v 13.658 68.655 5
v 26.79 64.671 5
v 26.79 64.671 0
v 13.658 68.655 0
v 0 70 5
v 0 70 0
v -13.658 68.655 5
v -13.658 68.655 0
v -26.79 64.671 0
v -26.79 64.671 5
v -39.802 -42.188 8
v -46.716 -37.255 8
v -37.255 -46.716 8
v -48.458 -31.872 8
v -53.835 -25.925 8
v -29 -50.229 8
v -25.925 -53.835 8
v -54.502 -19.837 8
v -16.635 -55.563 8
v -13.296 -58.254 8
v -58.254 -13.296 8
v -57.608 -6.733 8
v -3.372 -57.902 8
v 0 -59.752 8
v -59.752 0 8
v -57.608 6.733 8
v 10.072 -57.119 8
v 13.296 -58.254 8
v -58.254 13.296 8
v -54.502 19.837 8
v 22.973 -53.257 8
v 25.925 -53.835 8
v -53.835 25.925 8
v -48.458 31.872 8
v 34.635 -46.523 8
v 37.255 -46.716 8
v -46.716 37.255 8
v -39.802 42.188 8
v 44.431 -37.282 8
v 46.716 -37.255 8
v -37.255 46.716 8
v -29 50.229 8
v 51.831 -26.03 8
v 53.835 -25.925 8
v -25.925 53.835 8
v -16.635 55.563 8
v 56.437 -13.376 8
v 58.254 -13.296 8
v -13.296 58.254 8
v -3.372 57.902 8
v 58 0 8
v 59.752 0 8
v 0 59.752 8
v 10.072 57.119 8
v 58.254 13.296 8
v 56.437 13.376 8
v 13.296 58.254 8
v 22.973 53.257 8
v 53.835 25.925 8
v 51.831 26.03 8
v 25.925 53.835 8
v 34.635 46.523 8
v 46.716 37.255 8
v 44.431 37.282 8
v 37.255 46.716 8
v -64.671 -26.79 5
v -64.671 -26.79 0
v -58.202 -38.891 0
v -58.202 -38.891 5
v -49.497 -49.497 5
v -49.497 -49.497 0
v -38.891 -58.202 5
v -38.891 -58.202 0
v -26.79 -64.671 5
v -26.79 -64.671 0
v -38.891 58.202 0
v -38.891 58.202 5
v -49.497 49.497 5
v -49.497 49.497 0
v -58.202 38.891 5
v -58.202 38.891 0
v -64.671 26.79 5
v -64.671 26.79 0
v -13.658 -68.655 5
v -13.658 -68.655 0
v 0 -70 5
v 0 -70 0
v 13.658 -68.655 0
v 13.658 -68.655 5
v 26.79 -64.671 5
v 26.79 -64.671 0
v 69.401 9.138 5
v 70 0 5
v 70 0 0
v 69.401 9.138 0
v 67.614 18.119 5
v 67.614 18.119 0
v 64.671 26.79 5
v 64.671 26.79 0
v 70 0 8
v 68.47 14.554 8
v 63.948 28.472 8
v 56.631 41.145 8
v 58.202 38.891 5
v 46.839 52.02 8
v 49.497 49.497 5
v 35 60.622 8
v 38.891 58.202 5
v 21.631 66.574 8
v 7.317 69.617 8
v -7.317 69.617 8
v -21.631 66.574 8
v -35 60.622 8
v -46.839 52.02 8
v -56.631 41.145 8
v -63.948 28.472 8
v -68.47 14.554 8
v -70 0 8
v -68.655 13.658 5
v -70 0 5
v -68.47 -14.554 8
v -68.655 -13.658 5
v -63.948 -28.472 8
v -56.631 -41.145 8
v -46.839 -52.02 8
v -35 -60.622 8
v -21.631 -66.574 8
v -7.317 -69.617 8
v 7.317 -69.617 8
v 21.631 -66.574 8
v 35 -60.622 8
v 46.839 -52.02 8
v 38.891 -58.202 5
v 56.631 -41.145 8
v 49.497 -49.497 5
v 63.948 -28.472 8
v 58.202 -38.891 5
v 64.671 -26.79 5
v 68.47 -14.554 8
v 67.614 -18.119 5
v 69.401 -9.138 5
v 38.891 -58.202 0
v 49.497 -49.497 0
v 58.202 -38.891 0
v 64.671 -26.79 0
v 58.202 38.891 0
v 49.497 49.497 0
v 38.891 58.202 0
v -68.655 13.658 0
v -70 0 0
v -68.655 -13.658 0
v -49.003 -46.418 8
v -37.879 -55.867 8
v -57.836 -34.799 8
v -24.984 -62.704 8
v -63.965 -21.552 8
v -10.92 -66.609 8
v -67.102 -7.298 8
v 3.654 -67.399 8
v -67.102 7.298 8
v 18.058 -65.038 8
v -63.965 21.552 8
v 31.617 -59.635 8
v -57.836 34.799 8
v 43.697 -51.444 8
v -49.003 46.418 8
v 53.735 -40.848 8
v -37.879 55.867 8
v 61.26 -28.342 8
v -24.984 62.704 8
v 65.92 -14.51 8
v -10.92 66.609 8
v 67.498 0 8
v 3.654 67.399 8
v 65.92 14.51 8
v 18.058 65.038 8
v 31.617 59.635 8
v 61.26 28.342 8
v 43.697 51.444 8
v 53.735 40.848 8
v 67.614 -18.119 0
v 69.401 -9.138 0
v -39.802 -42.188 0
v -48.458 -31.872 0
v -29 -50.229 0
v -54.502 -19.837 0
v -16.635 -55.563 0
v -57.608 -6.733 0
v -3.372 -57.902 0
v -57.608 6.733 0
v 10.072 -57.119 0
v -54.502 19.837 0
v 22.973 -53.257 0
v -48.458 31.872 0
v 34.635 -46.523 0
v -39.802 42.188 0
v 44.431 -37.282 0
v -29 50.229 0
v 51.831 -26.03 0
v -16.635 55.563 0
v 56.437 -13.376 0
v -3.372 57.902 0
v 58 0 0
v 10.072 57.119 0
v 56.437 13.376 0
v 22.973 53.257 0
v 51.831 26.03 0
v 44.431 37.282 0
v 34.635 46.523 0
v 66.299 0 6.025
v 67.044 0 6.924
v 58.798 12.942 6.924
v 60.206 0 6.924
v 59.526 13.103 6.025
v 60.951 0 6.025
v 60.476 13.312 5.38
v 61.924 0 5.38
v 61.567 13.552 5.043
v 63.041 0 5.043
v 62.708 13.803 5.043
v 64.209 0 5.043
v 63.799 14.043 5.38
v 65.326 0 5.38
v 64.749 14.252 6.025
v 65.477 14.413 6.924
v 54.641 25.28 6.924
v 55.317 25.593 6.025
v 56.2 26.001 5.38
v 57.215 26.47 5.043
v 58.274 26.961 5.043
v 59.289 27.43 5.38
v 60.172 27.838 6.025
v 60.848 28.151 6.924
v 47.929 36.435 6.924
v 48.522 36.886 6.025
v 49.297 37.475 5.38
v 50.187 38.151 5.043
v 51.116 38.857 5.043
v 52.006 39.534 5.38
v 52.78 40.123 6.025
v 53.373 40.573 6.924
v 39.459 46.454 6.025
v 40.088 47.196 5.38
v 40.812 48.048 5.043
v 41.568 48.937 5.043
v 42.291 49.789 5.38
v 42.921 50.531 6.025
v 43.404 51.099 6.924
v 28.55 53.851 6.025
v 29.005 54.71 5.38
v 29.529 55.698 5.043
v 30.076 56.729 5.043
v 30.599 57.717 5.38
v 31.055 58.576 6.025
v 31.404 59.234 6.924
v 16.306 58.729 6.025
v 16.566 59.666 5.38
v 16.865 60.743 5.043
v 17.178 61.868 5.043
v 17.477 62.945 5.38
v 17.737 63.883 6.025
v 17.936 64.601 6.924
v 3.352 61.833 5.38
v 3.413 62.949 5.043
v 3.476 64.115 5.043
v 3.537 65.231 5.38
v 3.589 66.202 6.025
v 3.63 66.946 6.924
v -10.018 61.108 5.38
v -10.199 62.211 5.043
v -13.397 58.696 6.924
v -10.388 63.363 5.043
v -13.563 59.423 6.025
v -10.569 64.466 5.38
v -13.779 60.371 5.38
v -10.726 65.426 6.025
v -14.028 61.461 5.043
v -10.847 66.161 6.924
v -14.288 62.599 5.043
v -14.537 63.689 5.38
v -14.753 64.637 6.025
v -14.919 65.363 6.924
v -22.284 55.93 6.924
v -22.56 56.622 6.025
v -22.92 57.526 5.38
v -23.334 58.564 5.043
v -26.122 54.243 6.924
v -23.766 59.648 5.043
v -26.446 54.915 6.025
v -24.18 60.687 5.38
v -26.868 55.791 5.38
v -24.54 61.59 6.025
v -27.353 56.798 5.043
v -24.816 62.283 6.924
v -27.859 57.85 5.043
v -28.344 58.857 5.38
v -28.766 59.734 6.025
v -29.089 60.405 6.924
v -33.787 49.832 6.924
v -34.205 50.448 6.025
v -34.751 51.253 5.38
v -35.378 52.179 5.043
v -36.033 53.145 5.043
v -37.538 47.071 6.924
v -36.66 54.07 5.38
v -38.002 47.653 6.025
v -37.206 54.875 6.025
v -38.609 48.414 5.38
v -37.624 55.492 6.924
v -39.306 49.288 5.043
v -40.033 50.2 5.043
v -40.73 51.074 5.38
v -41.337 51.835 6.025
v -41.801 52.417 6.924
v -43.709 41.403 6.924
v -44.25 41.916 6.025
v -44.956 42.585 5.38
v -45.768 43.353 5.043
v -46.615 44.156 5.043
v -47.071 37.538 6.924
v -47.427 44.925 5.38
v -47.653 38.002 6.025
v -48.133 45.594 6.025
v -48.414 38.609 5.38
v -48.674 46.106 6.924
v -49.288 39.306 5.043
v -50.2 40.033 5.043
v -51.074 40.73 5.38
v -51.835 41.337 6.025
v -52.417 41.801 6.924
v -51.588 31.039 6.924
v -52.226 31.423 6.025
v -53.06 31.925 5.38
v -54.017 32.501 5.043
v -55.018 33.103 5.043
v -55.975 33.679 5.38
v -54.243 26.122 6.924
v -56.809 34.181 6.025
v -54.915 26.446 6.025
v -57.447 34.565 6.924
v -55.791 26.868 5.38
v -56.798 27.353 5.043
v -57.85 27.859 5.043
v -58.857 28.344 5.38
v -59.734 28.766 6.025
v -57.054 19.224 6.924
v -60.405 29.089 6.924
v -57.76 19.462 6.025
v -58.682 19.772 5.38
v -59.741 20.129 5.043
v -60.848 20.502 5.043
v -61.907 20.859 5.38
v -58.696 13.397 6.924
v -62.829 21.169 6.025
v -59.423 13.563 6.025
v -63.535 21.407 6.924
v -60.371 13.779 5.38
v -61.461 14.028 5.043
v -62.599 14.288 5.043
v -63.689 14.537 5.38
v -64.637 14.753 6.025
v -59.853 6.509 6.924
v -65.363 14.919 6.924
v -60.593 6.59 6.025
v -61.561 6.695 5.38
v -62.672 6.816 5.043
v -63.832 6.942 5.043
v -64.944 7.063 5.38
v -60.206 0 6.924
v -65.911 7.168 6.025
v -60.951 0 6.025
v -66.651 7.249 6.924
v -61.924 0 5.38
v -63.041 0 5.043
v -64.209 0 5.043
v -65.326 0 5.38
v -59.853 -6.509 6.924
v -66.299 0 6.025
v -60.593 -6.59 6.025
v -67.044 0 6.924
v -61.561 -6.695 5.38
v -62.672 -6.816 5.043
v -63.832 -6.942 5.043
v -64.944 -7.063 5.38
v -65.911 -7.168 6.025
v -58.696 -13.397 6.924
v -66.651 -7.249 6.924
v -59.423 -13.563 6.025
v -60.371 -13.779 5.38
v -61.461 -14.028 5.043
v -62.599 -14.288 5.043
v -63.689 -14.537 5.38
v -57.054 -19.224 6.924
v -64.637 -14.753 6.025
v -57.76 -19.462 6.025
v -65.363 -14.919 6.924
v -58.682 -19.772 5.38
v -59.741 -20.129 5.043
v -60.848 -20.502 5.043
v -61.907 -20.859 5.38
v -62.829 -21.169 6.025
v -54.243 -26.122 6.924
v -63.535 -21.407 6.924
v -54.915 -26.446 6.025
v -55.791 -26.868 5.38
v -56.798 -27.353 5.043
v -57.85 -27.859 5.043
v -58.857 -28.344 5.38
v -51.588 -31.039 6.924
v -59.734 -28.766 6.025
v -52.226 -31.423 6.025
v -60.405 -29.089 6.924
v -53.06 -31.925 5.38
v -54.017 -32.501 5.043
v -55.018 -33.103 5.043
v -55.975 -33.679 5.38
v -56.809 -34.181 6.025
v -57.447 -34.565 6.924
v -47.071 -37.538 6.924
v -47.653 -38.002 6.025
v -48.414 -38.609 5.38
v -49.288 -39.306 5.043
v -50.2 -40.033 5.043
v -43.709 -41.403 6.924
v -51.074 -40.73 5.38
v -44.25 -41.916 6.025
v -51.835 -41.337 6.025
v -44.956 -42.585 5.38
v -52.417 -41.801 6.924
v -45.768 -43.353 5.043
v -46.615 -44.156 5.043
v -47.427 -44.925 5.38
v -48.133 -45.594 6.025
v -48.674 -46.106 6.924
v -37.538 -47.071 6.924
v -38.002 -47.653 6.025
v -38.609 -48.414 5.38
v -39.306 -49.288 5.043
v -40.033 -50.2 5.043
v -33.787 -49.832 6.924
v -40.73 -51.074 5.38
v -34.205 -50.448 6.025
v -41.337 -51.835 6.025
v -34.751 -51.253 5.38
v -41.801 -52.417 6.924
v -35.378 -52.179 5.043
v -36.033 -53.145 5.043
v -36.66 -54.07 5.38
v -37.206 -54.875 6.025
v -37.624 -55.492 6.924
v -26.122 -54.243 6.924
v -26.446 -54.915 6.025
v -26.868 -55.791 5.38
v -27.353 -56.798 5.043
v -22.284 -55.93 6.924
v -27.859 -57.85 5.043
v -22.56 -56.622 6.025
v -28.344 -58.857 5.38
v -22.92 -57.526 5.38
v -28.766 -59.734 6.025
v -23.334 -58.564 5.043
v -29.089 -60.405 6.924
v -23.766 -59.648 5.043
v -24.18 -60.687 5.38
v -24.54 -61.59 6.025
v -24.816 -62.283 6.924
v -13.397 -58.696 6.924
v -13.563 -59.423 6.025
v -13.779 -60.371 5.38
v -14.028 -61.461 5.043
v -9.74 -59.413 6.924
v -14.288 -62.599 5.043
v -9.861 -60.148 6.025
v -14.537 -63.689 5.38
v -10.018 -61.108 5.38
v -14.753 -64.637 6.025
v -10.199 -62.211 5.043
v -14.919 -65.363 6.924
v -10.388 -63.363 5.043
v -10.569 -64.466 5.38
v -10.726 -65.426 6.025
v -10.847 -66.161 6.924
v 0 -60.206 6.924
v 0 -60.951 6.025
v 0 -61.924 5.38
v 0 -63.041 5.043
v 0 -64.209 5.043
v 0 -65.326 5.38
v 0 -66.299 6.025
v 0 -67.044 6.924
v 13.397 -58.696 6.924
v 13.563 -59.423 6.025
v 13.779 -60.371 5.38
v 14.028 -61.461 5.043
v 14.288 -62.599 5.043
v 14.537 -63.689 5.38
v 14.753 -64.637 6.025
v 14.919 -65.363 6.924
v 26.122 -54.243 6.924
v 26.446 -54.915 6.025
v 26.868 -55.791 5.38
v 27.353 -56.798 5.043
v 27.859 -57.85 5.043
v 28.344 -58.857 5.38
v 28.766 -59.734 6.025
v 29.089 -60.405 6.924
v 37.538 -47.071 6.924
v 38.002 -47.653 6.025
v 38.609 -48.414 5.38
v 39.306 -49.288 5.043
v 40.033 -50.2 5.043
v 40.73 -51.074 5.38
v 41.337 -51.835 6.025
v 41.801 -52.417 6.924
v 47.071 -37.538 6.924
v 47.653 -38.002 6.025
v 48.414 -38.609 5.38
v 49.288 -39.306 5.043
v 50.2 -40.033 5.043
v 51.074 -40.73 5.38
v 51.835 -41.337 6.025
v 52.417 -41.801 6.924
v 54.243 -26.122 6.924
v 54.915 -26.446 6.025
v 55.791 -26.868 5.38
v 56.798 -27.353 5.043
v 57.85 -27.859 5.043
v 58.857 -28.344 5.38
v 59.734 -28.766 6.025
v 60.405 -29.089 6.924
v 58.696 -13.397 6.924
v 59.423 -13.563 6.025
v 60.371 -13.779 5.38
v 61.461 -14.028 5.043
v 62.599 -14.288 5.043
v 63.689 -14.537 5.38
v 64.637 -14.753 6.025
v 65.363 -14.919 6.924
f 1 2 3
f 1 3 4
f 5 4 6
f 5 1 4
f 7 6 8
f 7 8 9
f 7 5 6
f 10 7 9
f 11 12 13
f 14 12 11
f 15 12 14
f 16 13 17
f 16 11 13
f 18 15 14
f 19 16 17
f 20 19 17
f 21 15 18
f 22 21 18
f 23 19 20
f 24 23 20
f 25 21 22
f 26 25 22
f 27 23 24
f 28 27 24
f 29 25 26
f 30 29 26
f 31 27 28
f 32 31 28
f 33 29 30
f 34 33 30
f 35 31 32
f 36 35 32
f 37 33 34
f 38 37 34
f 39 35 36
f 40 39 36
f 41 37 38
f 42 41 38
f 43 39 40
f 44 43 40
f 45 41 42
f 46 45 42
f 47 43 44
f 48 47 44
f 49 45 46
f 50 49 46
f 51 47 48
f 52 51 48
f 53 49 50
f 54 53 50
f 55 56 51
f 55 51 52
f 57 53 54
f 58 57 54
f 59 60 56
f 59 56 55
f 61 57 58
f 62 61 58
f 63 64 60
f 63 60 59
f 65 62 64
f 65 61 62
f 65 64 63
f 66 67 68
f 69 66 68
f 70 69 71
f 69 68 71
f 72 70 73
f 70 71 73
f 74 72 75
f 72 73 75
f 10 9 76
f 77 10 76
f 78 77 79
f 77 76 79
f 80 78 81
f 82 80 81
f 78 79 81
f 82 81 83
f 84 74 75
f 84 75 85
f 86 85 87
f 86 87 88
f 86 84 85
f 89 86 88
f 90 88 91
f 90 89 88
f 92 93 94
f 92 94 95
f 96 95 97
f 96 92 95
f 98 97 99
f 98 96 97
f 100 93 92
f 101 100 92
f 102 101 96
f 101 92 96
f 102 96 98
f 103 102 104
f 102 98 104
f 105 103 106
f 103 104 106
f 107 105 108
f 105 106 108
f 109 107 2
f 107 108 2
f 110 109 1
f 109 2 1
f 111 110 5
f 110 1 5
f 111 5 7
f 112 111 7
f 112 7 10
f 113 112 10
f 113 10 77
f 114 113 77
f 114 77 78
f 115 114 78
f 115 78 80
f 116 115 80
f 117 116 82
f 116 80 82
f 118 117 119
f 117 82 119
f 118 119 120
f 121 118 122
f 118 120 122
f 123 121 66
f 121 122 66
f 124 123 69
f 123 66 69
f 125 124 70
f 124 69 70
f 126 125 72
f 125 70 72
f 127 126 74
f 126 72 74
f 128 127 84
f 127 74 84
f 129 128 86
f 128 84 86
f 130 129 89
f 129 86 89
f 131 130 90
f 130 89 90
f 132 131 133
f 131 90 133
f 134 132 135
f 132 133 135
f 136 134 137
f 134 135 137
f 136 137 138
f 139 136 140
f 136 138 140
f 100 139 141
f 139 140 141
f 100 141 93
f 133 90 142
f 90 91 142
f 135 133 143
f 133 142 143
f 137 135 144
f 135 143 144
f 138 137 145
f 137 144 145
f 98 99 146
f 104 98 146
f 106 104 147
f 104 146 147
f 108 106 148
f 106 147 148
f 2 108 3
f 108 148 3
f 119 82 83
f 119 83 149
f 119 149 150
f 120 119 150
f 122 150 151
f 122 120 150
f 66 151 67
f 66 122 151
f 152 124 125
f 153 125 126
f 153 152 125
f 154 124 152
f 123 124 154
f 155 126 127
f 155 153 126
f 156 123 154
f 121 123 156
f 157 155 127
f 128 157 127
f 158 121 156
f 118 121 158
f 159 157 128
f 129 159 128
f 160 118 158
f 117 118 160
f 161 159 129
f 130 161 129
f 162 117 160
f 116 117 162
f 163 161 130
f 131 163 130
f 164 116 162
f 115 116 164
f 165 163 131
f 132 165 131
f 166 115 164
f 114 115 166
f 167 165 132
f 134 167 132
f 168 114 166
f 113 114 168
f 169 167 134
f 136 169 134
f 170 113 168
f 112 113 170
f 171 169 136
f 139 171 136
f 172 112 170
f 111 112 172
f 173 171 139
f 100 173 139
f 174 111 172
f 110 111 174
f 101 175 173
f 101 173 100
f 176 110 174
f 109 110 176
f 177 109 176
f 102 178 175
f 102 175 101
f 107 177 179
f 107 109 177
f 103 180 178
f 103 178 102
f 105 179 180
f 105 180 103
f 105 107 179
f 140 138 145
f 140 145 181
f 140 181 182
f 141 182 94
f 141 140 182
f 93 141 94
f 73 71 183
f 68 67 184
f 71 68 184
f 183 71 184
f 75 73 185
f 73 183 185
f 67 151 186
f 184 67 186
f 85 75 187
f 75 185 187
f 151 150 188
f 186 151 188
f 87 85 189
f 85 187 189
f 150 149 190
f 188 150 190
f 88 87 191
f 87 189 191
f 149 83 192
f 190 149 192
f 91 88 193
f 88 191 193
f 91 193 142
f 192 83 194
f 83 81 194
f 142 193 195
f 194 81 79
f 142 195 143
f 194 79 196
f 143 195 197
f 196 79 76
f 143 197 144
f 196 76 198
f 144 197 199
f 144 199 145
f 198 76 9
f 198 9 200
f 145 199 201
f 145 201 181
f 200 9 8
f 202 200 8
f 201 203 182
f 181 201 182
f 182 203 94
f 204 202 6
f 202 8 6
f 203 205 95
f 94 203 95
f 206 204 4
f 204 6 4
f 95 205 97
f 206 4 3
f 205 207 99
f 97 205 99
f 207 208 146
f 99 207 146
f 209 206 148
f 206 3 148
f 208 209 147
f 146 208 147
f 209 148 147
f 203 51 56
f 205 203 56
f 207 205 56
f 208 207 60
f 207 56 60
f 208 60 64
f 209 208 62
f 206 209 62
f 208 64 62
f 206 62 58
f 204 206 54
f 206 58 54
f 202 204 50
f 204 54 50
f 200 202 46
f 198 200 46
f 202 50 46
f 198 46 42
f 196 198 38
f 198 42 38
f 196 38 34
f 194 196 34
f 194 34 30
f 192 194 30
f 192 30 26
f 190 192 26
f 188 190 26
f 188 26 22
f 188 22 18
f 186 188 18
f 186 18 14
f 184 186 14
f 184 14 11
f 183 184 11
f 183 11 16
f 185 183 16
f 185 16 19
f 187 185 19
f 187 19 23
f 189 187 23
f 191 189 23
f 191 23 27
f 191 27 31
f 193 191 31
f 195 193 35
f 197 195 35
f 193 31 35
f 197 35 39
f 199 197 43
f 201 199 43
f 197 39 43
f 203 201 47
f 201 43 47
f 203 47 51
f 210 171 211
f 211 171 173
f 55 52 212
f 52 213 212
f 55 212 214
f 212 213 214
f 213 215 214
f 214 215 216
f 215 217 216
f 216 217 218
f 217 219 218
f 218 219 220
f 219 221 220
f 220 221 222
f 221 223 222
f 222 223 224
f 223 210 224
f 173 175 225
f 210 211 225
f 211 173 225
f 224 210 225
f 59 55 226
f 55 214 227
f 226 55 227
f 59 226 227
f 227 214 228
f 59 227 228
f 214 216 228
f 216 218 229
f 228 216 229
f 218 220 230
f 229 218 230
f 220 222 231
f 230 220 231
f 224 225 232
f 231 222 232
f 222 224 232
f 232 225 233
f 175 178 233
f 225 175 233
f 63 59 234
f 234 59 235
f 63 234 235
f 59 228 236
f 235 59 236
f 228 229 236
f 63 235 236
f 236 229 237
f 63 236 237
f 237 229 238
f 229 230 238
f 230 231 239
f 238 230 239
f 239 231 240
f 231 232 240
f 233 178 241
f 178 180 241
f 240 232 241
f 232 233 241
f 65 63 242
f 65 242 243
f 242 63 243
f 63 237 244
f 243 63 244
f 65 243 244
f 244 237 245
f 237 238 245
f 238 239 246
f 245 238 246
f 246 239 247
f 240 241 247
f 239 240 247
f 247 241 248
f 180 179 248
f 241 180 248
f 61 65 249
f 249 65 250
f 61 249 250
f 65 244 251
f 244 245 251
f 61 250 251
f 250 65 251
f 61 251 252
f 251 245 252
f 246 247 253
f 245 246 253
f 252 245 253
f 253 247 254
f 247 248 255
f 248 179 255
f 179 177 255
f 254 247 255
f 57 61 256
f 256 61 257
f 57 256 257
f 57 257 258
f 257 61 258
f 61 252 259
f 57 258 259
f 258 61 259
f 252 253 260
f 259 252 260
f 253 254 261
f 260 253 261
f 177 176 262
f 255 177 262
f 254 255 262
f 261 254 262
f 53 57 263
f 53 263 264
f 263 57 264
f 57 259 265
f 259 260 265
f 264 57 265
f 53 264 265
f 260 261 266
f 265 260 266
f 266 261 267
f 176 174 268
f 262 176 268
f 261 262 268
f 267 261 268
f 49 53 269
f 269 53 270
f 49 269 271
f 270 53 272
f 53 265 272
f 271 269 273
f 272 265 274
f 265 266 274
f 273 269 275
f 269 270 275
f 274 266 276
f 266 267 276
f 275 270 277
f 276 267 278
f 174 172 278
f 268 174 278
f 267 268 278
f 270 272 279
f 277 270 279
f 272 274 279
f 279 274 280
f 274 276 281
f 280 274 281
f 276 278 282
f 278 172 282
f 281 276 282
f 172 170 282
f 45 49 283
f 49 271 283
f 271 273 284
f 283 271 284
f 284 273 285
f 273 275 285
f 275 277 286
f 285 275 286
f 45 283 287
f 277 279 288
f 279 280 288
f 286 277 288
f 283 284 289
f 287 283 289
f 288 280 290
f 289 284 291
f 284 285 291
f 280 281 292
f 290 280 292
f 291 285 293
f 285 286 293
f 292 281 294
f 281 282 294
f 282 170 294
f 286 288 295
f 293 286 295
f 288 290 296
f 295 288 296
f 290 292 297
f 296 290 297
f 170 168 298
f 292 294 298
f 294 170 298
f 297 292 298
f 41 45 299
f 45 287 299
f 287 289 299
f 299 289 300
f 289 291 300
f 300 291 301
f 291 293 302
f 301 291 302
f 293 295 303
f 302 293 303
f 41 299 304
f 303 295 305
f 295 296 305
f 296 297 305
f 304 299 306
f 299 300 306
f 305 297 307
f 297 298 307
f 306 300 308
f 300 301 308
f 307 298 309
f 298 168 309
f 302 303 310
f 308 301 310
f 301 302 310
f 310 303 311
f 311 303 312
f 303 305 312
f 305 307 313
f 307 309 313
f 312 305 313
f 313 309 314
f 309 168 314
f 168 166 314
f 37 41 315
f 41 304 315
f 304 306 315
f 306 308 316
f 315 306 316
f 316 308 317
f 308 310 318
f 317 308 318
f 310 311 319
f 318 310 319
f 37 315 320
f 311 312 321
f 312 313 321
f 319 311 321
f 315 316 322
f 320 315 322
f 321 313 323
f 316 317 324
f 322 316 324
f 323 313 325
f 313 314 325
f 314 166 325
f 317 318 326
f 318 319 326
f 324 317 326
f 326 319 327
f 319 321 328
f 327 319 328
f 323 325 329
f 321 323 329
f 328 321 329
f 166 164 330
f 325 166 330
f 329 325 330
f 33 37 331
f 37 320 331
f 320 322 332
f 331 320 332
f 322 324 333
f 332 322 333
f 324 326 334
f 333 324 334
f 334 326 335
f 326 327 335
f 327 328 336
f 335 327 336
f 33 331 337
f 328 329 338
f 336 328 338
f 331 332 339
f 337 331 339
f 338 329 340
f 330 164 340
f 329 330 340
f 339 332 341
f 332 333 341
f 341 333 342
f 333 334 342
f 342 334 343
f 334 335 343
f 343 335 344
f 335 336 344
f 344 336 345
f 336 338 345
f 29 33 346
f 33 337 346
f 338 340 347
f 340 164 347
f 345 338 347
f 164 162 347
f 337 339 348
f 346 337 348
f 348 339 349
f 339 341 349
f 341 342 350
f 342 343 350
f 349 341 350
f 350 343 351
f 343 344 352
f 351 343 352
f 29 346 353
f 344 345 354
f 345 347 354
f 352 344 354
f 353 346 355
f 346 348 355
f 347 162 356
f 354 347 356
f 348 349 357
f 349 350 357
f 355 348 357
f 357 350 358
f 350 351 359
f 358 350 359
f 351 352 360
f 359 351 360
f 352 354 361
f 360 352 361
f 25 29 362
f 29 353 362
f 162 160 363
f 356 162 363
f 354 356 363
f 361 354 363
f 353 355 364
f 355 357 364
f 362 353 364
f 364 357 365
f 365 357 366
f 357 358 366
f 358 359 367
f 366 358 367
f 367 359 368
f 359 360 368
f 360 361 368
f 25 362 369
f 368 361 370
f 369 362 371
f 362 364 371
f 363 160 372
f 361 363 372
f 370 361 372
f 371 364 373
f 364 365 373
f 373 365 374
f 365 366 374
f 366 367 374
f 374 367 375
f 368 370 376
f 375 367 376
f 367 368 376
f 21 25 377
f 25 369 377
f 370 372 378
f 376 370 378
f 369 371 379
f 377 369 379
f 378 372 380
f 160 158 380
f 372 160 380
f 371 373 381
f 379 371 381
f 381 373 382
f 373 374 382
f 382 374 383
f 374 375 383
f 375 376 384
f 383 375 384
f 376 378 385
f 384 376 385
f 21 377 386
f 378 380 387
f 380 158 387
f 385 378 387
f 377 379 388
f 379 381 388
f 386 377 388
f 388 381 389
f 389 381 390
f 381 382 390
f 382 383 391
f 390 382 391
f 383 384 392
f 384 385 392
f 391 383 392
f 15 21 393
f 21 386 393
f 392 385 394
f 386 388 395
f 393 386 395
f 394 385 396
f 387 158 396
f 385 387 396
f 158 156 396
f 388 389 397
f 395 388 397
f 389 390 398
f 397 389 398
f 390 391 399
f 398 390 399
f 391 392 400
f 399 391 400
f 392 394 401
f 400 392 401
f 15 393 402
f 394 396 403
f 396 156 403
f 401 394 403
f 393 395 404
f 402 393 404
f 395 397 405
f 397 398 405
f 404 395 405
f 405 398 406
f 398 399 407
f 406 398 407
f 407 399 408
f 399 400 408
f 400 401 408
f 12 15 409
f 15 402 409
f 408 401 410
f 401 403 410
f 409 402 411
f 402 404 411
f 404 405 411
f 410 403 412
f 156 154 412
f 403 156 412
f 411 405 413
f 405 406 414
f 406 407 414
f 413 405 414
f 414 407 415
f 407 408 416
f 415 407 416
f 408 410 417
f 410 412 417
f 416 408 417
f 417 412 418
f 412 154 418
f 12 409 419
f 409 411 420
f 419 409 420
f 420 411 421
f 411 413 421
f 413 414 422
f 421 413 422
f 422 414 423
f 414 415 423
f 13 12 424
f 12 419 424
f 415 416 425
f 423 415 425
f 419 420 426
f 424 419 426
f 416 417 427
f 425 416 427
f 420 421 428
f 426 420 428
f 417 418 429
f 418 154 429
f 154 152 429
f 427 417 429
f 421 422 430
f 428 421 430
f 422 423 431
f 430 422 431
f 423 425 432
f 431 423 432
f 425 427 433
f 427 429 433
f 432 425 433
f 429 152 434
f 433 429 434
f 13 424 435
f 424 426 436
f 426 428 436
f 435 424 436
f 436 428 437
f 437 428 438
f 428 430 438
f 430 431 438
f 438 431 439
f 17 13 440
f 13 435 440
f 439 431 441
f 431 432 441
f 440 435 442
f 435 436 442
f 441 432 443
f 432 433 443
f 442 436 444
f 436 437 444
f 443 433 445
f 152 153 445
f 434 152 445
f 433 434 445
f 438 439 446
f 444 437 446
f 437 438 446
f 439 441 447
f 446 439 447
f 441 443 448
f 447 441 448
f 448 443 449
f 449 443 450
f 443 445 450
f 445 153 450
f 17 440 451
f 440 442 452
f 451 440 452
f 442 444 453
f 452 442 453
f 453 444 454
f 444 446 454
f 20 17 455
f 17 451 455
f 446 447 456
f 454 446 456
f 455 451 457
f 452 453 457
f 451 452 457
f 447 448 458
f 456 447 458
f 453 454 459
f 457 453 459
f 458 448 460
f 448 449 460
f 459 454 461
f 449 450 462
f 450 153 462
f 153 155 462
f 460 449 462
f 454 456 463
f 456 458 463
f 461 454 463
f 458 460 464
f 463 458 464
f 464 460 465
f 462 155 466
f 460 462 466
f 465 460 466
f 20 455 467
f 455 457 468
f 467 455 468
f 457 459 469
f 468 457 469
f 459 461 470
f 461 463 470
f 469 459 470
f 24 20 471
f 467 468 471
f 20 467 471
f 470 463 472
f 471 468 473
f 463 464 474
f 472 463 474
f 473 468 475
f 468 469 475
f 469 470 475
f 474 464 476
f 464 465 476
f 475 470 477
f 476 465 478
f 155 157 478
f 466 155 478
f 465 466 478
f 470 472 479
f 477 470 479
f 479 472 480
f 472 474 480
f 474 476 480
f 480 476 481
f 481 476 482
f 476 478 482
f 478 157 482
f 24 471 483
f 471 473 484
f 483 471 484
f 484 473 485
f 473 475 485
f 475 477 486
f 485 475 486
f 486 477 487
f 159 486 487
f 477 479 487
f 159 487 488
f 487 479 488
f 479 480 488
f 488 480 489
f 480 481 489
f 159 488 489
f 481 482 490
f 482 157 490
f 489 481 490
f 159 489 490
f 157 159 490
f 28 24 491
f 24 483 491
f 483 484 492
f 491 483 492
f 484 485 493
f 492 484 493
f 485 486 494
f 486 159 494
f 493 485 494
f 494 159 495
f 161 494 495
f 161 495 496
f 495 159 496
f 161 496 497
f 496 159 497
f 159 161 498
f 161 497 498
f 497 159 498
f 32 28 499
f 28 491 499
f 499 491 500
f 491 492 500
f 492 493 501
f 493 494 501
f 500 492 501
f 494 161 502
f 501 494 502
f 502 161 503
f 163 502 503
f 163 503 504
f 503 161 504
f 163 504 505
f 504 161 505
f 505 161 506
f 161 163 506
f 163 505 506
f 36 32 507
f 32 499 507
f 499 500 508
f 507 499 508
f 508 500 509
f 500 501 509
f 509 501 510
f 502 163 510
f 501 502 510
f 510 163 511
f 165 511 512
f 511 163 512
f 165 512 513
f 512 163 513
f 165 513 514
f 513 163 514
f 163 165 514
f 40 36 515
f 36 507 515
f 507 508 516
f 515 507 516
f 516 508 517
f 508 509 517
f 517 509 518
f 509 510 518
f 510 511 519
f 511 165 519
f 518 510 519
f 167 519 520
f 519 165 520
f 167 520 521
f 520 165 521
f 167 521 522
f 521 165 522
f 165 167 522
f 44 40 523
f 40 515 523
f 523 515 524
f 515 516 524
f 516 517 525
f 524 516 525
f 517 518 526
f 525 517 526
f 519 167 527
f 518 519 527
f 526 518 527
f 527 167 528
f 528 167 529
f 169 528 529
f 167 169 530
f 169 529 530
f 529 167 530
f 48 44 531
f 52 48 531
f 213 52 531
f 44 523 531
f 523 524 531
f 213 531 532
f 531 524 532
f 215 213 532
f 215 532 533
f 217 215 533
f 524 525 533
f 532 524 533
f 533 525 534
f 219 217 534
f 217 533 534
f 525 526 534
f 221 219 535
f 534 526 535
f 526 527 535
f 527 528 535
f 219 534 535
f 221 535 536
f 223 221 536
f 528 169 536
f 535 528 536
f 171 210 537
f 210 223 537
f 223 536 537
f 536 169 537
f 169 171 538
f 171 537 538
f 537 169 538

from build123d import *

# Parameters (mm, degrees)
SKETCH_R        = 70
SKETCH_R_2      = 57.25
PAD_DEPTH       = 15
SKETCH001_R     = 4
SKETCH002_W     = 40
SKETCH002_H     = 40
PAD001_DEPTH    = 5
SKETCH003_R     = 2.5
POCKET_DEPTH    = 5
FILLET_R        = 18
FILLET001_R     = 11
SKETCH004_R     = 58
POCKET001_DEPTH = 15.001
SKETCH005_R     = 71
POCKET002_DEPTH = 7
SKETCH006_R     = 4
SKETCH007_R     = 105
SKETCH007_R_2   = 70
POCKET003_DEPTH = 5


with BuildPart() as part:
    # Sketch → Pad (new body)
    with BuildSketch(Plane.XY):
        Circle(SKETCH_R)
        Circle(SKETCH_R_2, mode=Mode.SUBTRACT)
    extrude(amount=PAD_DEPTH)

    # Sketch001 → Groove (revolve, cut)
    with BuildSketch(Plane.XZ):
        with Locations((63.625, 16)):
            Circle(SKETCH001_R)
    revolve(axis=Axis((0, 0, 0), (0, 0, 1)), mode=Mode.SUBTRACT)

    # Sketch002 (on Face2 of Groove) → Pad001 (join)
    with BuildSketch(Plane(origin=(0, 0, 0), x_dir=(1, 0, 0), z_dir=(0, 0, -1))):
        with Locations((82, 0)):
            Rectangle(SKETCH002_W, SKETCH002_H)
        with Locations((-82, 0)):
            Rectangle(SKETCH002_W, SKETCH002_H)
        with Locations((0, 82)):
            Rectangle(SKETCH002_W, SKETCH002_H)
        with Locations((0, -82)):
            Rectangle(SKETCH002_W, SKETCH002_H)
    extrude(amount=-PAD001_DEPTH)

    # Sketch003 (on Face13 of Pad001) → Pocket (cut)
    with BuildSketch(Plane.XY.offset(5)):
        with Locations((-86.25, 0)):
            Circle(SKETCH003_R)
        with Locations((0, -86.25)):
            Circle(SKETCH003_R)
        with Locations((86.25, 0)):
            Circle(SKETCH003_R)
        with Locations((0, 86.25)):
            Circle(SKETCH003_R)
    extrude(amount=-POCKET_DEPTH, mode=Mode.SUBTRACT)

    # Fillet
    fillet_edges = [part.edges().sort_by_distance(p)[0] for p in [
        (-20, 102, 2.5),
        (20, 102, 2.5),
        (102, 20, 2.5),
        (102, -20, 2.5),
        (20, -102, 2.5),
        (-20, -102, 2.5),
        (-102, -20, 2.5),
        (-102, 20, 2.5),
    ]]
    fillet(fillet_edges, radius=FILLET_R)

    # Fillet001
    fillet001_edges = [part.edges().sort_by_distance(p)[0] for p in [
        (67.082039, 20, 2.5),
        (20, 67.082039, 2.5),
        (-20, 67.082039, 2.5),
        (-67.082039, 20, 2.5),
        (-67.082039, -20, 2.5),
        (-20, -67.082039, 2.5),
        (20, -67.082039, 2.5),
        (67.082039, -20, 2.5),
    ]]
    fillet(fillet001_edges, radius=FILLET001_R)

    # Sketch004 (on Face41 of Fillet001) → Pocket001 (cut, through all)
    with BuildSketch(Plane.XY.offset(15)):
        Circle(SKETCH004_R)
    extrude(amount=-POCKET001_DEPTH, mode=Mode.SUBTRACT)

    # Sketch005 (on Face38 of Pocket001) → Pocket002 (cut)
    with BuildSketch(Plane.XY.offset(15)):
        Circle(SKETCH005_R)
    extrude(amount=-POCKET002_DEPTH, mode=Mode.SUBTRACT)

    # Sketch006 → Groove001 (revolve, cut)
    with BuildSketch(Plane.XZ):
        with Locations((63.625, 9)):
            Circle(SKETCH006_R)
    revolve(axis=Axis((0, 0, 0), (0, 0, 1)), mode=Mode.SUBTRACT)

    # Sketch007 (on Face37 of Groove001) → Pocket003 (cut)
    with BuildSketch(Plane.XY.offset(5)):
        Circle(SKETCH007_R)
        Circle(SKETCH007_R_2, mode=Mode.SUBTRACT)
    extrude(amount=-POCKET003_DEPTH, mode=Mode.SUBTRACT)


solid = part.part
